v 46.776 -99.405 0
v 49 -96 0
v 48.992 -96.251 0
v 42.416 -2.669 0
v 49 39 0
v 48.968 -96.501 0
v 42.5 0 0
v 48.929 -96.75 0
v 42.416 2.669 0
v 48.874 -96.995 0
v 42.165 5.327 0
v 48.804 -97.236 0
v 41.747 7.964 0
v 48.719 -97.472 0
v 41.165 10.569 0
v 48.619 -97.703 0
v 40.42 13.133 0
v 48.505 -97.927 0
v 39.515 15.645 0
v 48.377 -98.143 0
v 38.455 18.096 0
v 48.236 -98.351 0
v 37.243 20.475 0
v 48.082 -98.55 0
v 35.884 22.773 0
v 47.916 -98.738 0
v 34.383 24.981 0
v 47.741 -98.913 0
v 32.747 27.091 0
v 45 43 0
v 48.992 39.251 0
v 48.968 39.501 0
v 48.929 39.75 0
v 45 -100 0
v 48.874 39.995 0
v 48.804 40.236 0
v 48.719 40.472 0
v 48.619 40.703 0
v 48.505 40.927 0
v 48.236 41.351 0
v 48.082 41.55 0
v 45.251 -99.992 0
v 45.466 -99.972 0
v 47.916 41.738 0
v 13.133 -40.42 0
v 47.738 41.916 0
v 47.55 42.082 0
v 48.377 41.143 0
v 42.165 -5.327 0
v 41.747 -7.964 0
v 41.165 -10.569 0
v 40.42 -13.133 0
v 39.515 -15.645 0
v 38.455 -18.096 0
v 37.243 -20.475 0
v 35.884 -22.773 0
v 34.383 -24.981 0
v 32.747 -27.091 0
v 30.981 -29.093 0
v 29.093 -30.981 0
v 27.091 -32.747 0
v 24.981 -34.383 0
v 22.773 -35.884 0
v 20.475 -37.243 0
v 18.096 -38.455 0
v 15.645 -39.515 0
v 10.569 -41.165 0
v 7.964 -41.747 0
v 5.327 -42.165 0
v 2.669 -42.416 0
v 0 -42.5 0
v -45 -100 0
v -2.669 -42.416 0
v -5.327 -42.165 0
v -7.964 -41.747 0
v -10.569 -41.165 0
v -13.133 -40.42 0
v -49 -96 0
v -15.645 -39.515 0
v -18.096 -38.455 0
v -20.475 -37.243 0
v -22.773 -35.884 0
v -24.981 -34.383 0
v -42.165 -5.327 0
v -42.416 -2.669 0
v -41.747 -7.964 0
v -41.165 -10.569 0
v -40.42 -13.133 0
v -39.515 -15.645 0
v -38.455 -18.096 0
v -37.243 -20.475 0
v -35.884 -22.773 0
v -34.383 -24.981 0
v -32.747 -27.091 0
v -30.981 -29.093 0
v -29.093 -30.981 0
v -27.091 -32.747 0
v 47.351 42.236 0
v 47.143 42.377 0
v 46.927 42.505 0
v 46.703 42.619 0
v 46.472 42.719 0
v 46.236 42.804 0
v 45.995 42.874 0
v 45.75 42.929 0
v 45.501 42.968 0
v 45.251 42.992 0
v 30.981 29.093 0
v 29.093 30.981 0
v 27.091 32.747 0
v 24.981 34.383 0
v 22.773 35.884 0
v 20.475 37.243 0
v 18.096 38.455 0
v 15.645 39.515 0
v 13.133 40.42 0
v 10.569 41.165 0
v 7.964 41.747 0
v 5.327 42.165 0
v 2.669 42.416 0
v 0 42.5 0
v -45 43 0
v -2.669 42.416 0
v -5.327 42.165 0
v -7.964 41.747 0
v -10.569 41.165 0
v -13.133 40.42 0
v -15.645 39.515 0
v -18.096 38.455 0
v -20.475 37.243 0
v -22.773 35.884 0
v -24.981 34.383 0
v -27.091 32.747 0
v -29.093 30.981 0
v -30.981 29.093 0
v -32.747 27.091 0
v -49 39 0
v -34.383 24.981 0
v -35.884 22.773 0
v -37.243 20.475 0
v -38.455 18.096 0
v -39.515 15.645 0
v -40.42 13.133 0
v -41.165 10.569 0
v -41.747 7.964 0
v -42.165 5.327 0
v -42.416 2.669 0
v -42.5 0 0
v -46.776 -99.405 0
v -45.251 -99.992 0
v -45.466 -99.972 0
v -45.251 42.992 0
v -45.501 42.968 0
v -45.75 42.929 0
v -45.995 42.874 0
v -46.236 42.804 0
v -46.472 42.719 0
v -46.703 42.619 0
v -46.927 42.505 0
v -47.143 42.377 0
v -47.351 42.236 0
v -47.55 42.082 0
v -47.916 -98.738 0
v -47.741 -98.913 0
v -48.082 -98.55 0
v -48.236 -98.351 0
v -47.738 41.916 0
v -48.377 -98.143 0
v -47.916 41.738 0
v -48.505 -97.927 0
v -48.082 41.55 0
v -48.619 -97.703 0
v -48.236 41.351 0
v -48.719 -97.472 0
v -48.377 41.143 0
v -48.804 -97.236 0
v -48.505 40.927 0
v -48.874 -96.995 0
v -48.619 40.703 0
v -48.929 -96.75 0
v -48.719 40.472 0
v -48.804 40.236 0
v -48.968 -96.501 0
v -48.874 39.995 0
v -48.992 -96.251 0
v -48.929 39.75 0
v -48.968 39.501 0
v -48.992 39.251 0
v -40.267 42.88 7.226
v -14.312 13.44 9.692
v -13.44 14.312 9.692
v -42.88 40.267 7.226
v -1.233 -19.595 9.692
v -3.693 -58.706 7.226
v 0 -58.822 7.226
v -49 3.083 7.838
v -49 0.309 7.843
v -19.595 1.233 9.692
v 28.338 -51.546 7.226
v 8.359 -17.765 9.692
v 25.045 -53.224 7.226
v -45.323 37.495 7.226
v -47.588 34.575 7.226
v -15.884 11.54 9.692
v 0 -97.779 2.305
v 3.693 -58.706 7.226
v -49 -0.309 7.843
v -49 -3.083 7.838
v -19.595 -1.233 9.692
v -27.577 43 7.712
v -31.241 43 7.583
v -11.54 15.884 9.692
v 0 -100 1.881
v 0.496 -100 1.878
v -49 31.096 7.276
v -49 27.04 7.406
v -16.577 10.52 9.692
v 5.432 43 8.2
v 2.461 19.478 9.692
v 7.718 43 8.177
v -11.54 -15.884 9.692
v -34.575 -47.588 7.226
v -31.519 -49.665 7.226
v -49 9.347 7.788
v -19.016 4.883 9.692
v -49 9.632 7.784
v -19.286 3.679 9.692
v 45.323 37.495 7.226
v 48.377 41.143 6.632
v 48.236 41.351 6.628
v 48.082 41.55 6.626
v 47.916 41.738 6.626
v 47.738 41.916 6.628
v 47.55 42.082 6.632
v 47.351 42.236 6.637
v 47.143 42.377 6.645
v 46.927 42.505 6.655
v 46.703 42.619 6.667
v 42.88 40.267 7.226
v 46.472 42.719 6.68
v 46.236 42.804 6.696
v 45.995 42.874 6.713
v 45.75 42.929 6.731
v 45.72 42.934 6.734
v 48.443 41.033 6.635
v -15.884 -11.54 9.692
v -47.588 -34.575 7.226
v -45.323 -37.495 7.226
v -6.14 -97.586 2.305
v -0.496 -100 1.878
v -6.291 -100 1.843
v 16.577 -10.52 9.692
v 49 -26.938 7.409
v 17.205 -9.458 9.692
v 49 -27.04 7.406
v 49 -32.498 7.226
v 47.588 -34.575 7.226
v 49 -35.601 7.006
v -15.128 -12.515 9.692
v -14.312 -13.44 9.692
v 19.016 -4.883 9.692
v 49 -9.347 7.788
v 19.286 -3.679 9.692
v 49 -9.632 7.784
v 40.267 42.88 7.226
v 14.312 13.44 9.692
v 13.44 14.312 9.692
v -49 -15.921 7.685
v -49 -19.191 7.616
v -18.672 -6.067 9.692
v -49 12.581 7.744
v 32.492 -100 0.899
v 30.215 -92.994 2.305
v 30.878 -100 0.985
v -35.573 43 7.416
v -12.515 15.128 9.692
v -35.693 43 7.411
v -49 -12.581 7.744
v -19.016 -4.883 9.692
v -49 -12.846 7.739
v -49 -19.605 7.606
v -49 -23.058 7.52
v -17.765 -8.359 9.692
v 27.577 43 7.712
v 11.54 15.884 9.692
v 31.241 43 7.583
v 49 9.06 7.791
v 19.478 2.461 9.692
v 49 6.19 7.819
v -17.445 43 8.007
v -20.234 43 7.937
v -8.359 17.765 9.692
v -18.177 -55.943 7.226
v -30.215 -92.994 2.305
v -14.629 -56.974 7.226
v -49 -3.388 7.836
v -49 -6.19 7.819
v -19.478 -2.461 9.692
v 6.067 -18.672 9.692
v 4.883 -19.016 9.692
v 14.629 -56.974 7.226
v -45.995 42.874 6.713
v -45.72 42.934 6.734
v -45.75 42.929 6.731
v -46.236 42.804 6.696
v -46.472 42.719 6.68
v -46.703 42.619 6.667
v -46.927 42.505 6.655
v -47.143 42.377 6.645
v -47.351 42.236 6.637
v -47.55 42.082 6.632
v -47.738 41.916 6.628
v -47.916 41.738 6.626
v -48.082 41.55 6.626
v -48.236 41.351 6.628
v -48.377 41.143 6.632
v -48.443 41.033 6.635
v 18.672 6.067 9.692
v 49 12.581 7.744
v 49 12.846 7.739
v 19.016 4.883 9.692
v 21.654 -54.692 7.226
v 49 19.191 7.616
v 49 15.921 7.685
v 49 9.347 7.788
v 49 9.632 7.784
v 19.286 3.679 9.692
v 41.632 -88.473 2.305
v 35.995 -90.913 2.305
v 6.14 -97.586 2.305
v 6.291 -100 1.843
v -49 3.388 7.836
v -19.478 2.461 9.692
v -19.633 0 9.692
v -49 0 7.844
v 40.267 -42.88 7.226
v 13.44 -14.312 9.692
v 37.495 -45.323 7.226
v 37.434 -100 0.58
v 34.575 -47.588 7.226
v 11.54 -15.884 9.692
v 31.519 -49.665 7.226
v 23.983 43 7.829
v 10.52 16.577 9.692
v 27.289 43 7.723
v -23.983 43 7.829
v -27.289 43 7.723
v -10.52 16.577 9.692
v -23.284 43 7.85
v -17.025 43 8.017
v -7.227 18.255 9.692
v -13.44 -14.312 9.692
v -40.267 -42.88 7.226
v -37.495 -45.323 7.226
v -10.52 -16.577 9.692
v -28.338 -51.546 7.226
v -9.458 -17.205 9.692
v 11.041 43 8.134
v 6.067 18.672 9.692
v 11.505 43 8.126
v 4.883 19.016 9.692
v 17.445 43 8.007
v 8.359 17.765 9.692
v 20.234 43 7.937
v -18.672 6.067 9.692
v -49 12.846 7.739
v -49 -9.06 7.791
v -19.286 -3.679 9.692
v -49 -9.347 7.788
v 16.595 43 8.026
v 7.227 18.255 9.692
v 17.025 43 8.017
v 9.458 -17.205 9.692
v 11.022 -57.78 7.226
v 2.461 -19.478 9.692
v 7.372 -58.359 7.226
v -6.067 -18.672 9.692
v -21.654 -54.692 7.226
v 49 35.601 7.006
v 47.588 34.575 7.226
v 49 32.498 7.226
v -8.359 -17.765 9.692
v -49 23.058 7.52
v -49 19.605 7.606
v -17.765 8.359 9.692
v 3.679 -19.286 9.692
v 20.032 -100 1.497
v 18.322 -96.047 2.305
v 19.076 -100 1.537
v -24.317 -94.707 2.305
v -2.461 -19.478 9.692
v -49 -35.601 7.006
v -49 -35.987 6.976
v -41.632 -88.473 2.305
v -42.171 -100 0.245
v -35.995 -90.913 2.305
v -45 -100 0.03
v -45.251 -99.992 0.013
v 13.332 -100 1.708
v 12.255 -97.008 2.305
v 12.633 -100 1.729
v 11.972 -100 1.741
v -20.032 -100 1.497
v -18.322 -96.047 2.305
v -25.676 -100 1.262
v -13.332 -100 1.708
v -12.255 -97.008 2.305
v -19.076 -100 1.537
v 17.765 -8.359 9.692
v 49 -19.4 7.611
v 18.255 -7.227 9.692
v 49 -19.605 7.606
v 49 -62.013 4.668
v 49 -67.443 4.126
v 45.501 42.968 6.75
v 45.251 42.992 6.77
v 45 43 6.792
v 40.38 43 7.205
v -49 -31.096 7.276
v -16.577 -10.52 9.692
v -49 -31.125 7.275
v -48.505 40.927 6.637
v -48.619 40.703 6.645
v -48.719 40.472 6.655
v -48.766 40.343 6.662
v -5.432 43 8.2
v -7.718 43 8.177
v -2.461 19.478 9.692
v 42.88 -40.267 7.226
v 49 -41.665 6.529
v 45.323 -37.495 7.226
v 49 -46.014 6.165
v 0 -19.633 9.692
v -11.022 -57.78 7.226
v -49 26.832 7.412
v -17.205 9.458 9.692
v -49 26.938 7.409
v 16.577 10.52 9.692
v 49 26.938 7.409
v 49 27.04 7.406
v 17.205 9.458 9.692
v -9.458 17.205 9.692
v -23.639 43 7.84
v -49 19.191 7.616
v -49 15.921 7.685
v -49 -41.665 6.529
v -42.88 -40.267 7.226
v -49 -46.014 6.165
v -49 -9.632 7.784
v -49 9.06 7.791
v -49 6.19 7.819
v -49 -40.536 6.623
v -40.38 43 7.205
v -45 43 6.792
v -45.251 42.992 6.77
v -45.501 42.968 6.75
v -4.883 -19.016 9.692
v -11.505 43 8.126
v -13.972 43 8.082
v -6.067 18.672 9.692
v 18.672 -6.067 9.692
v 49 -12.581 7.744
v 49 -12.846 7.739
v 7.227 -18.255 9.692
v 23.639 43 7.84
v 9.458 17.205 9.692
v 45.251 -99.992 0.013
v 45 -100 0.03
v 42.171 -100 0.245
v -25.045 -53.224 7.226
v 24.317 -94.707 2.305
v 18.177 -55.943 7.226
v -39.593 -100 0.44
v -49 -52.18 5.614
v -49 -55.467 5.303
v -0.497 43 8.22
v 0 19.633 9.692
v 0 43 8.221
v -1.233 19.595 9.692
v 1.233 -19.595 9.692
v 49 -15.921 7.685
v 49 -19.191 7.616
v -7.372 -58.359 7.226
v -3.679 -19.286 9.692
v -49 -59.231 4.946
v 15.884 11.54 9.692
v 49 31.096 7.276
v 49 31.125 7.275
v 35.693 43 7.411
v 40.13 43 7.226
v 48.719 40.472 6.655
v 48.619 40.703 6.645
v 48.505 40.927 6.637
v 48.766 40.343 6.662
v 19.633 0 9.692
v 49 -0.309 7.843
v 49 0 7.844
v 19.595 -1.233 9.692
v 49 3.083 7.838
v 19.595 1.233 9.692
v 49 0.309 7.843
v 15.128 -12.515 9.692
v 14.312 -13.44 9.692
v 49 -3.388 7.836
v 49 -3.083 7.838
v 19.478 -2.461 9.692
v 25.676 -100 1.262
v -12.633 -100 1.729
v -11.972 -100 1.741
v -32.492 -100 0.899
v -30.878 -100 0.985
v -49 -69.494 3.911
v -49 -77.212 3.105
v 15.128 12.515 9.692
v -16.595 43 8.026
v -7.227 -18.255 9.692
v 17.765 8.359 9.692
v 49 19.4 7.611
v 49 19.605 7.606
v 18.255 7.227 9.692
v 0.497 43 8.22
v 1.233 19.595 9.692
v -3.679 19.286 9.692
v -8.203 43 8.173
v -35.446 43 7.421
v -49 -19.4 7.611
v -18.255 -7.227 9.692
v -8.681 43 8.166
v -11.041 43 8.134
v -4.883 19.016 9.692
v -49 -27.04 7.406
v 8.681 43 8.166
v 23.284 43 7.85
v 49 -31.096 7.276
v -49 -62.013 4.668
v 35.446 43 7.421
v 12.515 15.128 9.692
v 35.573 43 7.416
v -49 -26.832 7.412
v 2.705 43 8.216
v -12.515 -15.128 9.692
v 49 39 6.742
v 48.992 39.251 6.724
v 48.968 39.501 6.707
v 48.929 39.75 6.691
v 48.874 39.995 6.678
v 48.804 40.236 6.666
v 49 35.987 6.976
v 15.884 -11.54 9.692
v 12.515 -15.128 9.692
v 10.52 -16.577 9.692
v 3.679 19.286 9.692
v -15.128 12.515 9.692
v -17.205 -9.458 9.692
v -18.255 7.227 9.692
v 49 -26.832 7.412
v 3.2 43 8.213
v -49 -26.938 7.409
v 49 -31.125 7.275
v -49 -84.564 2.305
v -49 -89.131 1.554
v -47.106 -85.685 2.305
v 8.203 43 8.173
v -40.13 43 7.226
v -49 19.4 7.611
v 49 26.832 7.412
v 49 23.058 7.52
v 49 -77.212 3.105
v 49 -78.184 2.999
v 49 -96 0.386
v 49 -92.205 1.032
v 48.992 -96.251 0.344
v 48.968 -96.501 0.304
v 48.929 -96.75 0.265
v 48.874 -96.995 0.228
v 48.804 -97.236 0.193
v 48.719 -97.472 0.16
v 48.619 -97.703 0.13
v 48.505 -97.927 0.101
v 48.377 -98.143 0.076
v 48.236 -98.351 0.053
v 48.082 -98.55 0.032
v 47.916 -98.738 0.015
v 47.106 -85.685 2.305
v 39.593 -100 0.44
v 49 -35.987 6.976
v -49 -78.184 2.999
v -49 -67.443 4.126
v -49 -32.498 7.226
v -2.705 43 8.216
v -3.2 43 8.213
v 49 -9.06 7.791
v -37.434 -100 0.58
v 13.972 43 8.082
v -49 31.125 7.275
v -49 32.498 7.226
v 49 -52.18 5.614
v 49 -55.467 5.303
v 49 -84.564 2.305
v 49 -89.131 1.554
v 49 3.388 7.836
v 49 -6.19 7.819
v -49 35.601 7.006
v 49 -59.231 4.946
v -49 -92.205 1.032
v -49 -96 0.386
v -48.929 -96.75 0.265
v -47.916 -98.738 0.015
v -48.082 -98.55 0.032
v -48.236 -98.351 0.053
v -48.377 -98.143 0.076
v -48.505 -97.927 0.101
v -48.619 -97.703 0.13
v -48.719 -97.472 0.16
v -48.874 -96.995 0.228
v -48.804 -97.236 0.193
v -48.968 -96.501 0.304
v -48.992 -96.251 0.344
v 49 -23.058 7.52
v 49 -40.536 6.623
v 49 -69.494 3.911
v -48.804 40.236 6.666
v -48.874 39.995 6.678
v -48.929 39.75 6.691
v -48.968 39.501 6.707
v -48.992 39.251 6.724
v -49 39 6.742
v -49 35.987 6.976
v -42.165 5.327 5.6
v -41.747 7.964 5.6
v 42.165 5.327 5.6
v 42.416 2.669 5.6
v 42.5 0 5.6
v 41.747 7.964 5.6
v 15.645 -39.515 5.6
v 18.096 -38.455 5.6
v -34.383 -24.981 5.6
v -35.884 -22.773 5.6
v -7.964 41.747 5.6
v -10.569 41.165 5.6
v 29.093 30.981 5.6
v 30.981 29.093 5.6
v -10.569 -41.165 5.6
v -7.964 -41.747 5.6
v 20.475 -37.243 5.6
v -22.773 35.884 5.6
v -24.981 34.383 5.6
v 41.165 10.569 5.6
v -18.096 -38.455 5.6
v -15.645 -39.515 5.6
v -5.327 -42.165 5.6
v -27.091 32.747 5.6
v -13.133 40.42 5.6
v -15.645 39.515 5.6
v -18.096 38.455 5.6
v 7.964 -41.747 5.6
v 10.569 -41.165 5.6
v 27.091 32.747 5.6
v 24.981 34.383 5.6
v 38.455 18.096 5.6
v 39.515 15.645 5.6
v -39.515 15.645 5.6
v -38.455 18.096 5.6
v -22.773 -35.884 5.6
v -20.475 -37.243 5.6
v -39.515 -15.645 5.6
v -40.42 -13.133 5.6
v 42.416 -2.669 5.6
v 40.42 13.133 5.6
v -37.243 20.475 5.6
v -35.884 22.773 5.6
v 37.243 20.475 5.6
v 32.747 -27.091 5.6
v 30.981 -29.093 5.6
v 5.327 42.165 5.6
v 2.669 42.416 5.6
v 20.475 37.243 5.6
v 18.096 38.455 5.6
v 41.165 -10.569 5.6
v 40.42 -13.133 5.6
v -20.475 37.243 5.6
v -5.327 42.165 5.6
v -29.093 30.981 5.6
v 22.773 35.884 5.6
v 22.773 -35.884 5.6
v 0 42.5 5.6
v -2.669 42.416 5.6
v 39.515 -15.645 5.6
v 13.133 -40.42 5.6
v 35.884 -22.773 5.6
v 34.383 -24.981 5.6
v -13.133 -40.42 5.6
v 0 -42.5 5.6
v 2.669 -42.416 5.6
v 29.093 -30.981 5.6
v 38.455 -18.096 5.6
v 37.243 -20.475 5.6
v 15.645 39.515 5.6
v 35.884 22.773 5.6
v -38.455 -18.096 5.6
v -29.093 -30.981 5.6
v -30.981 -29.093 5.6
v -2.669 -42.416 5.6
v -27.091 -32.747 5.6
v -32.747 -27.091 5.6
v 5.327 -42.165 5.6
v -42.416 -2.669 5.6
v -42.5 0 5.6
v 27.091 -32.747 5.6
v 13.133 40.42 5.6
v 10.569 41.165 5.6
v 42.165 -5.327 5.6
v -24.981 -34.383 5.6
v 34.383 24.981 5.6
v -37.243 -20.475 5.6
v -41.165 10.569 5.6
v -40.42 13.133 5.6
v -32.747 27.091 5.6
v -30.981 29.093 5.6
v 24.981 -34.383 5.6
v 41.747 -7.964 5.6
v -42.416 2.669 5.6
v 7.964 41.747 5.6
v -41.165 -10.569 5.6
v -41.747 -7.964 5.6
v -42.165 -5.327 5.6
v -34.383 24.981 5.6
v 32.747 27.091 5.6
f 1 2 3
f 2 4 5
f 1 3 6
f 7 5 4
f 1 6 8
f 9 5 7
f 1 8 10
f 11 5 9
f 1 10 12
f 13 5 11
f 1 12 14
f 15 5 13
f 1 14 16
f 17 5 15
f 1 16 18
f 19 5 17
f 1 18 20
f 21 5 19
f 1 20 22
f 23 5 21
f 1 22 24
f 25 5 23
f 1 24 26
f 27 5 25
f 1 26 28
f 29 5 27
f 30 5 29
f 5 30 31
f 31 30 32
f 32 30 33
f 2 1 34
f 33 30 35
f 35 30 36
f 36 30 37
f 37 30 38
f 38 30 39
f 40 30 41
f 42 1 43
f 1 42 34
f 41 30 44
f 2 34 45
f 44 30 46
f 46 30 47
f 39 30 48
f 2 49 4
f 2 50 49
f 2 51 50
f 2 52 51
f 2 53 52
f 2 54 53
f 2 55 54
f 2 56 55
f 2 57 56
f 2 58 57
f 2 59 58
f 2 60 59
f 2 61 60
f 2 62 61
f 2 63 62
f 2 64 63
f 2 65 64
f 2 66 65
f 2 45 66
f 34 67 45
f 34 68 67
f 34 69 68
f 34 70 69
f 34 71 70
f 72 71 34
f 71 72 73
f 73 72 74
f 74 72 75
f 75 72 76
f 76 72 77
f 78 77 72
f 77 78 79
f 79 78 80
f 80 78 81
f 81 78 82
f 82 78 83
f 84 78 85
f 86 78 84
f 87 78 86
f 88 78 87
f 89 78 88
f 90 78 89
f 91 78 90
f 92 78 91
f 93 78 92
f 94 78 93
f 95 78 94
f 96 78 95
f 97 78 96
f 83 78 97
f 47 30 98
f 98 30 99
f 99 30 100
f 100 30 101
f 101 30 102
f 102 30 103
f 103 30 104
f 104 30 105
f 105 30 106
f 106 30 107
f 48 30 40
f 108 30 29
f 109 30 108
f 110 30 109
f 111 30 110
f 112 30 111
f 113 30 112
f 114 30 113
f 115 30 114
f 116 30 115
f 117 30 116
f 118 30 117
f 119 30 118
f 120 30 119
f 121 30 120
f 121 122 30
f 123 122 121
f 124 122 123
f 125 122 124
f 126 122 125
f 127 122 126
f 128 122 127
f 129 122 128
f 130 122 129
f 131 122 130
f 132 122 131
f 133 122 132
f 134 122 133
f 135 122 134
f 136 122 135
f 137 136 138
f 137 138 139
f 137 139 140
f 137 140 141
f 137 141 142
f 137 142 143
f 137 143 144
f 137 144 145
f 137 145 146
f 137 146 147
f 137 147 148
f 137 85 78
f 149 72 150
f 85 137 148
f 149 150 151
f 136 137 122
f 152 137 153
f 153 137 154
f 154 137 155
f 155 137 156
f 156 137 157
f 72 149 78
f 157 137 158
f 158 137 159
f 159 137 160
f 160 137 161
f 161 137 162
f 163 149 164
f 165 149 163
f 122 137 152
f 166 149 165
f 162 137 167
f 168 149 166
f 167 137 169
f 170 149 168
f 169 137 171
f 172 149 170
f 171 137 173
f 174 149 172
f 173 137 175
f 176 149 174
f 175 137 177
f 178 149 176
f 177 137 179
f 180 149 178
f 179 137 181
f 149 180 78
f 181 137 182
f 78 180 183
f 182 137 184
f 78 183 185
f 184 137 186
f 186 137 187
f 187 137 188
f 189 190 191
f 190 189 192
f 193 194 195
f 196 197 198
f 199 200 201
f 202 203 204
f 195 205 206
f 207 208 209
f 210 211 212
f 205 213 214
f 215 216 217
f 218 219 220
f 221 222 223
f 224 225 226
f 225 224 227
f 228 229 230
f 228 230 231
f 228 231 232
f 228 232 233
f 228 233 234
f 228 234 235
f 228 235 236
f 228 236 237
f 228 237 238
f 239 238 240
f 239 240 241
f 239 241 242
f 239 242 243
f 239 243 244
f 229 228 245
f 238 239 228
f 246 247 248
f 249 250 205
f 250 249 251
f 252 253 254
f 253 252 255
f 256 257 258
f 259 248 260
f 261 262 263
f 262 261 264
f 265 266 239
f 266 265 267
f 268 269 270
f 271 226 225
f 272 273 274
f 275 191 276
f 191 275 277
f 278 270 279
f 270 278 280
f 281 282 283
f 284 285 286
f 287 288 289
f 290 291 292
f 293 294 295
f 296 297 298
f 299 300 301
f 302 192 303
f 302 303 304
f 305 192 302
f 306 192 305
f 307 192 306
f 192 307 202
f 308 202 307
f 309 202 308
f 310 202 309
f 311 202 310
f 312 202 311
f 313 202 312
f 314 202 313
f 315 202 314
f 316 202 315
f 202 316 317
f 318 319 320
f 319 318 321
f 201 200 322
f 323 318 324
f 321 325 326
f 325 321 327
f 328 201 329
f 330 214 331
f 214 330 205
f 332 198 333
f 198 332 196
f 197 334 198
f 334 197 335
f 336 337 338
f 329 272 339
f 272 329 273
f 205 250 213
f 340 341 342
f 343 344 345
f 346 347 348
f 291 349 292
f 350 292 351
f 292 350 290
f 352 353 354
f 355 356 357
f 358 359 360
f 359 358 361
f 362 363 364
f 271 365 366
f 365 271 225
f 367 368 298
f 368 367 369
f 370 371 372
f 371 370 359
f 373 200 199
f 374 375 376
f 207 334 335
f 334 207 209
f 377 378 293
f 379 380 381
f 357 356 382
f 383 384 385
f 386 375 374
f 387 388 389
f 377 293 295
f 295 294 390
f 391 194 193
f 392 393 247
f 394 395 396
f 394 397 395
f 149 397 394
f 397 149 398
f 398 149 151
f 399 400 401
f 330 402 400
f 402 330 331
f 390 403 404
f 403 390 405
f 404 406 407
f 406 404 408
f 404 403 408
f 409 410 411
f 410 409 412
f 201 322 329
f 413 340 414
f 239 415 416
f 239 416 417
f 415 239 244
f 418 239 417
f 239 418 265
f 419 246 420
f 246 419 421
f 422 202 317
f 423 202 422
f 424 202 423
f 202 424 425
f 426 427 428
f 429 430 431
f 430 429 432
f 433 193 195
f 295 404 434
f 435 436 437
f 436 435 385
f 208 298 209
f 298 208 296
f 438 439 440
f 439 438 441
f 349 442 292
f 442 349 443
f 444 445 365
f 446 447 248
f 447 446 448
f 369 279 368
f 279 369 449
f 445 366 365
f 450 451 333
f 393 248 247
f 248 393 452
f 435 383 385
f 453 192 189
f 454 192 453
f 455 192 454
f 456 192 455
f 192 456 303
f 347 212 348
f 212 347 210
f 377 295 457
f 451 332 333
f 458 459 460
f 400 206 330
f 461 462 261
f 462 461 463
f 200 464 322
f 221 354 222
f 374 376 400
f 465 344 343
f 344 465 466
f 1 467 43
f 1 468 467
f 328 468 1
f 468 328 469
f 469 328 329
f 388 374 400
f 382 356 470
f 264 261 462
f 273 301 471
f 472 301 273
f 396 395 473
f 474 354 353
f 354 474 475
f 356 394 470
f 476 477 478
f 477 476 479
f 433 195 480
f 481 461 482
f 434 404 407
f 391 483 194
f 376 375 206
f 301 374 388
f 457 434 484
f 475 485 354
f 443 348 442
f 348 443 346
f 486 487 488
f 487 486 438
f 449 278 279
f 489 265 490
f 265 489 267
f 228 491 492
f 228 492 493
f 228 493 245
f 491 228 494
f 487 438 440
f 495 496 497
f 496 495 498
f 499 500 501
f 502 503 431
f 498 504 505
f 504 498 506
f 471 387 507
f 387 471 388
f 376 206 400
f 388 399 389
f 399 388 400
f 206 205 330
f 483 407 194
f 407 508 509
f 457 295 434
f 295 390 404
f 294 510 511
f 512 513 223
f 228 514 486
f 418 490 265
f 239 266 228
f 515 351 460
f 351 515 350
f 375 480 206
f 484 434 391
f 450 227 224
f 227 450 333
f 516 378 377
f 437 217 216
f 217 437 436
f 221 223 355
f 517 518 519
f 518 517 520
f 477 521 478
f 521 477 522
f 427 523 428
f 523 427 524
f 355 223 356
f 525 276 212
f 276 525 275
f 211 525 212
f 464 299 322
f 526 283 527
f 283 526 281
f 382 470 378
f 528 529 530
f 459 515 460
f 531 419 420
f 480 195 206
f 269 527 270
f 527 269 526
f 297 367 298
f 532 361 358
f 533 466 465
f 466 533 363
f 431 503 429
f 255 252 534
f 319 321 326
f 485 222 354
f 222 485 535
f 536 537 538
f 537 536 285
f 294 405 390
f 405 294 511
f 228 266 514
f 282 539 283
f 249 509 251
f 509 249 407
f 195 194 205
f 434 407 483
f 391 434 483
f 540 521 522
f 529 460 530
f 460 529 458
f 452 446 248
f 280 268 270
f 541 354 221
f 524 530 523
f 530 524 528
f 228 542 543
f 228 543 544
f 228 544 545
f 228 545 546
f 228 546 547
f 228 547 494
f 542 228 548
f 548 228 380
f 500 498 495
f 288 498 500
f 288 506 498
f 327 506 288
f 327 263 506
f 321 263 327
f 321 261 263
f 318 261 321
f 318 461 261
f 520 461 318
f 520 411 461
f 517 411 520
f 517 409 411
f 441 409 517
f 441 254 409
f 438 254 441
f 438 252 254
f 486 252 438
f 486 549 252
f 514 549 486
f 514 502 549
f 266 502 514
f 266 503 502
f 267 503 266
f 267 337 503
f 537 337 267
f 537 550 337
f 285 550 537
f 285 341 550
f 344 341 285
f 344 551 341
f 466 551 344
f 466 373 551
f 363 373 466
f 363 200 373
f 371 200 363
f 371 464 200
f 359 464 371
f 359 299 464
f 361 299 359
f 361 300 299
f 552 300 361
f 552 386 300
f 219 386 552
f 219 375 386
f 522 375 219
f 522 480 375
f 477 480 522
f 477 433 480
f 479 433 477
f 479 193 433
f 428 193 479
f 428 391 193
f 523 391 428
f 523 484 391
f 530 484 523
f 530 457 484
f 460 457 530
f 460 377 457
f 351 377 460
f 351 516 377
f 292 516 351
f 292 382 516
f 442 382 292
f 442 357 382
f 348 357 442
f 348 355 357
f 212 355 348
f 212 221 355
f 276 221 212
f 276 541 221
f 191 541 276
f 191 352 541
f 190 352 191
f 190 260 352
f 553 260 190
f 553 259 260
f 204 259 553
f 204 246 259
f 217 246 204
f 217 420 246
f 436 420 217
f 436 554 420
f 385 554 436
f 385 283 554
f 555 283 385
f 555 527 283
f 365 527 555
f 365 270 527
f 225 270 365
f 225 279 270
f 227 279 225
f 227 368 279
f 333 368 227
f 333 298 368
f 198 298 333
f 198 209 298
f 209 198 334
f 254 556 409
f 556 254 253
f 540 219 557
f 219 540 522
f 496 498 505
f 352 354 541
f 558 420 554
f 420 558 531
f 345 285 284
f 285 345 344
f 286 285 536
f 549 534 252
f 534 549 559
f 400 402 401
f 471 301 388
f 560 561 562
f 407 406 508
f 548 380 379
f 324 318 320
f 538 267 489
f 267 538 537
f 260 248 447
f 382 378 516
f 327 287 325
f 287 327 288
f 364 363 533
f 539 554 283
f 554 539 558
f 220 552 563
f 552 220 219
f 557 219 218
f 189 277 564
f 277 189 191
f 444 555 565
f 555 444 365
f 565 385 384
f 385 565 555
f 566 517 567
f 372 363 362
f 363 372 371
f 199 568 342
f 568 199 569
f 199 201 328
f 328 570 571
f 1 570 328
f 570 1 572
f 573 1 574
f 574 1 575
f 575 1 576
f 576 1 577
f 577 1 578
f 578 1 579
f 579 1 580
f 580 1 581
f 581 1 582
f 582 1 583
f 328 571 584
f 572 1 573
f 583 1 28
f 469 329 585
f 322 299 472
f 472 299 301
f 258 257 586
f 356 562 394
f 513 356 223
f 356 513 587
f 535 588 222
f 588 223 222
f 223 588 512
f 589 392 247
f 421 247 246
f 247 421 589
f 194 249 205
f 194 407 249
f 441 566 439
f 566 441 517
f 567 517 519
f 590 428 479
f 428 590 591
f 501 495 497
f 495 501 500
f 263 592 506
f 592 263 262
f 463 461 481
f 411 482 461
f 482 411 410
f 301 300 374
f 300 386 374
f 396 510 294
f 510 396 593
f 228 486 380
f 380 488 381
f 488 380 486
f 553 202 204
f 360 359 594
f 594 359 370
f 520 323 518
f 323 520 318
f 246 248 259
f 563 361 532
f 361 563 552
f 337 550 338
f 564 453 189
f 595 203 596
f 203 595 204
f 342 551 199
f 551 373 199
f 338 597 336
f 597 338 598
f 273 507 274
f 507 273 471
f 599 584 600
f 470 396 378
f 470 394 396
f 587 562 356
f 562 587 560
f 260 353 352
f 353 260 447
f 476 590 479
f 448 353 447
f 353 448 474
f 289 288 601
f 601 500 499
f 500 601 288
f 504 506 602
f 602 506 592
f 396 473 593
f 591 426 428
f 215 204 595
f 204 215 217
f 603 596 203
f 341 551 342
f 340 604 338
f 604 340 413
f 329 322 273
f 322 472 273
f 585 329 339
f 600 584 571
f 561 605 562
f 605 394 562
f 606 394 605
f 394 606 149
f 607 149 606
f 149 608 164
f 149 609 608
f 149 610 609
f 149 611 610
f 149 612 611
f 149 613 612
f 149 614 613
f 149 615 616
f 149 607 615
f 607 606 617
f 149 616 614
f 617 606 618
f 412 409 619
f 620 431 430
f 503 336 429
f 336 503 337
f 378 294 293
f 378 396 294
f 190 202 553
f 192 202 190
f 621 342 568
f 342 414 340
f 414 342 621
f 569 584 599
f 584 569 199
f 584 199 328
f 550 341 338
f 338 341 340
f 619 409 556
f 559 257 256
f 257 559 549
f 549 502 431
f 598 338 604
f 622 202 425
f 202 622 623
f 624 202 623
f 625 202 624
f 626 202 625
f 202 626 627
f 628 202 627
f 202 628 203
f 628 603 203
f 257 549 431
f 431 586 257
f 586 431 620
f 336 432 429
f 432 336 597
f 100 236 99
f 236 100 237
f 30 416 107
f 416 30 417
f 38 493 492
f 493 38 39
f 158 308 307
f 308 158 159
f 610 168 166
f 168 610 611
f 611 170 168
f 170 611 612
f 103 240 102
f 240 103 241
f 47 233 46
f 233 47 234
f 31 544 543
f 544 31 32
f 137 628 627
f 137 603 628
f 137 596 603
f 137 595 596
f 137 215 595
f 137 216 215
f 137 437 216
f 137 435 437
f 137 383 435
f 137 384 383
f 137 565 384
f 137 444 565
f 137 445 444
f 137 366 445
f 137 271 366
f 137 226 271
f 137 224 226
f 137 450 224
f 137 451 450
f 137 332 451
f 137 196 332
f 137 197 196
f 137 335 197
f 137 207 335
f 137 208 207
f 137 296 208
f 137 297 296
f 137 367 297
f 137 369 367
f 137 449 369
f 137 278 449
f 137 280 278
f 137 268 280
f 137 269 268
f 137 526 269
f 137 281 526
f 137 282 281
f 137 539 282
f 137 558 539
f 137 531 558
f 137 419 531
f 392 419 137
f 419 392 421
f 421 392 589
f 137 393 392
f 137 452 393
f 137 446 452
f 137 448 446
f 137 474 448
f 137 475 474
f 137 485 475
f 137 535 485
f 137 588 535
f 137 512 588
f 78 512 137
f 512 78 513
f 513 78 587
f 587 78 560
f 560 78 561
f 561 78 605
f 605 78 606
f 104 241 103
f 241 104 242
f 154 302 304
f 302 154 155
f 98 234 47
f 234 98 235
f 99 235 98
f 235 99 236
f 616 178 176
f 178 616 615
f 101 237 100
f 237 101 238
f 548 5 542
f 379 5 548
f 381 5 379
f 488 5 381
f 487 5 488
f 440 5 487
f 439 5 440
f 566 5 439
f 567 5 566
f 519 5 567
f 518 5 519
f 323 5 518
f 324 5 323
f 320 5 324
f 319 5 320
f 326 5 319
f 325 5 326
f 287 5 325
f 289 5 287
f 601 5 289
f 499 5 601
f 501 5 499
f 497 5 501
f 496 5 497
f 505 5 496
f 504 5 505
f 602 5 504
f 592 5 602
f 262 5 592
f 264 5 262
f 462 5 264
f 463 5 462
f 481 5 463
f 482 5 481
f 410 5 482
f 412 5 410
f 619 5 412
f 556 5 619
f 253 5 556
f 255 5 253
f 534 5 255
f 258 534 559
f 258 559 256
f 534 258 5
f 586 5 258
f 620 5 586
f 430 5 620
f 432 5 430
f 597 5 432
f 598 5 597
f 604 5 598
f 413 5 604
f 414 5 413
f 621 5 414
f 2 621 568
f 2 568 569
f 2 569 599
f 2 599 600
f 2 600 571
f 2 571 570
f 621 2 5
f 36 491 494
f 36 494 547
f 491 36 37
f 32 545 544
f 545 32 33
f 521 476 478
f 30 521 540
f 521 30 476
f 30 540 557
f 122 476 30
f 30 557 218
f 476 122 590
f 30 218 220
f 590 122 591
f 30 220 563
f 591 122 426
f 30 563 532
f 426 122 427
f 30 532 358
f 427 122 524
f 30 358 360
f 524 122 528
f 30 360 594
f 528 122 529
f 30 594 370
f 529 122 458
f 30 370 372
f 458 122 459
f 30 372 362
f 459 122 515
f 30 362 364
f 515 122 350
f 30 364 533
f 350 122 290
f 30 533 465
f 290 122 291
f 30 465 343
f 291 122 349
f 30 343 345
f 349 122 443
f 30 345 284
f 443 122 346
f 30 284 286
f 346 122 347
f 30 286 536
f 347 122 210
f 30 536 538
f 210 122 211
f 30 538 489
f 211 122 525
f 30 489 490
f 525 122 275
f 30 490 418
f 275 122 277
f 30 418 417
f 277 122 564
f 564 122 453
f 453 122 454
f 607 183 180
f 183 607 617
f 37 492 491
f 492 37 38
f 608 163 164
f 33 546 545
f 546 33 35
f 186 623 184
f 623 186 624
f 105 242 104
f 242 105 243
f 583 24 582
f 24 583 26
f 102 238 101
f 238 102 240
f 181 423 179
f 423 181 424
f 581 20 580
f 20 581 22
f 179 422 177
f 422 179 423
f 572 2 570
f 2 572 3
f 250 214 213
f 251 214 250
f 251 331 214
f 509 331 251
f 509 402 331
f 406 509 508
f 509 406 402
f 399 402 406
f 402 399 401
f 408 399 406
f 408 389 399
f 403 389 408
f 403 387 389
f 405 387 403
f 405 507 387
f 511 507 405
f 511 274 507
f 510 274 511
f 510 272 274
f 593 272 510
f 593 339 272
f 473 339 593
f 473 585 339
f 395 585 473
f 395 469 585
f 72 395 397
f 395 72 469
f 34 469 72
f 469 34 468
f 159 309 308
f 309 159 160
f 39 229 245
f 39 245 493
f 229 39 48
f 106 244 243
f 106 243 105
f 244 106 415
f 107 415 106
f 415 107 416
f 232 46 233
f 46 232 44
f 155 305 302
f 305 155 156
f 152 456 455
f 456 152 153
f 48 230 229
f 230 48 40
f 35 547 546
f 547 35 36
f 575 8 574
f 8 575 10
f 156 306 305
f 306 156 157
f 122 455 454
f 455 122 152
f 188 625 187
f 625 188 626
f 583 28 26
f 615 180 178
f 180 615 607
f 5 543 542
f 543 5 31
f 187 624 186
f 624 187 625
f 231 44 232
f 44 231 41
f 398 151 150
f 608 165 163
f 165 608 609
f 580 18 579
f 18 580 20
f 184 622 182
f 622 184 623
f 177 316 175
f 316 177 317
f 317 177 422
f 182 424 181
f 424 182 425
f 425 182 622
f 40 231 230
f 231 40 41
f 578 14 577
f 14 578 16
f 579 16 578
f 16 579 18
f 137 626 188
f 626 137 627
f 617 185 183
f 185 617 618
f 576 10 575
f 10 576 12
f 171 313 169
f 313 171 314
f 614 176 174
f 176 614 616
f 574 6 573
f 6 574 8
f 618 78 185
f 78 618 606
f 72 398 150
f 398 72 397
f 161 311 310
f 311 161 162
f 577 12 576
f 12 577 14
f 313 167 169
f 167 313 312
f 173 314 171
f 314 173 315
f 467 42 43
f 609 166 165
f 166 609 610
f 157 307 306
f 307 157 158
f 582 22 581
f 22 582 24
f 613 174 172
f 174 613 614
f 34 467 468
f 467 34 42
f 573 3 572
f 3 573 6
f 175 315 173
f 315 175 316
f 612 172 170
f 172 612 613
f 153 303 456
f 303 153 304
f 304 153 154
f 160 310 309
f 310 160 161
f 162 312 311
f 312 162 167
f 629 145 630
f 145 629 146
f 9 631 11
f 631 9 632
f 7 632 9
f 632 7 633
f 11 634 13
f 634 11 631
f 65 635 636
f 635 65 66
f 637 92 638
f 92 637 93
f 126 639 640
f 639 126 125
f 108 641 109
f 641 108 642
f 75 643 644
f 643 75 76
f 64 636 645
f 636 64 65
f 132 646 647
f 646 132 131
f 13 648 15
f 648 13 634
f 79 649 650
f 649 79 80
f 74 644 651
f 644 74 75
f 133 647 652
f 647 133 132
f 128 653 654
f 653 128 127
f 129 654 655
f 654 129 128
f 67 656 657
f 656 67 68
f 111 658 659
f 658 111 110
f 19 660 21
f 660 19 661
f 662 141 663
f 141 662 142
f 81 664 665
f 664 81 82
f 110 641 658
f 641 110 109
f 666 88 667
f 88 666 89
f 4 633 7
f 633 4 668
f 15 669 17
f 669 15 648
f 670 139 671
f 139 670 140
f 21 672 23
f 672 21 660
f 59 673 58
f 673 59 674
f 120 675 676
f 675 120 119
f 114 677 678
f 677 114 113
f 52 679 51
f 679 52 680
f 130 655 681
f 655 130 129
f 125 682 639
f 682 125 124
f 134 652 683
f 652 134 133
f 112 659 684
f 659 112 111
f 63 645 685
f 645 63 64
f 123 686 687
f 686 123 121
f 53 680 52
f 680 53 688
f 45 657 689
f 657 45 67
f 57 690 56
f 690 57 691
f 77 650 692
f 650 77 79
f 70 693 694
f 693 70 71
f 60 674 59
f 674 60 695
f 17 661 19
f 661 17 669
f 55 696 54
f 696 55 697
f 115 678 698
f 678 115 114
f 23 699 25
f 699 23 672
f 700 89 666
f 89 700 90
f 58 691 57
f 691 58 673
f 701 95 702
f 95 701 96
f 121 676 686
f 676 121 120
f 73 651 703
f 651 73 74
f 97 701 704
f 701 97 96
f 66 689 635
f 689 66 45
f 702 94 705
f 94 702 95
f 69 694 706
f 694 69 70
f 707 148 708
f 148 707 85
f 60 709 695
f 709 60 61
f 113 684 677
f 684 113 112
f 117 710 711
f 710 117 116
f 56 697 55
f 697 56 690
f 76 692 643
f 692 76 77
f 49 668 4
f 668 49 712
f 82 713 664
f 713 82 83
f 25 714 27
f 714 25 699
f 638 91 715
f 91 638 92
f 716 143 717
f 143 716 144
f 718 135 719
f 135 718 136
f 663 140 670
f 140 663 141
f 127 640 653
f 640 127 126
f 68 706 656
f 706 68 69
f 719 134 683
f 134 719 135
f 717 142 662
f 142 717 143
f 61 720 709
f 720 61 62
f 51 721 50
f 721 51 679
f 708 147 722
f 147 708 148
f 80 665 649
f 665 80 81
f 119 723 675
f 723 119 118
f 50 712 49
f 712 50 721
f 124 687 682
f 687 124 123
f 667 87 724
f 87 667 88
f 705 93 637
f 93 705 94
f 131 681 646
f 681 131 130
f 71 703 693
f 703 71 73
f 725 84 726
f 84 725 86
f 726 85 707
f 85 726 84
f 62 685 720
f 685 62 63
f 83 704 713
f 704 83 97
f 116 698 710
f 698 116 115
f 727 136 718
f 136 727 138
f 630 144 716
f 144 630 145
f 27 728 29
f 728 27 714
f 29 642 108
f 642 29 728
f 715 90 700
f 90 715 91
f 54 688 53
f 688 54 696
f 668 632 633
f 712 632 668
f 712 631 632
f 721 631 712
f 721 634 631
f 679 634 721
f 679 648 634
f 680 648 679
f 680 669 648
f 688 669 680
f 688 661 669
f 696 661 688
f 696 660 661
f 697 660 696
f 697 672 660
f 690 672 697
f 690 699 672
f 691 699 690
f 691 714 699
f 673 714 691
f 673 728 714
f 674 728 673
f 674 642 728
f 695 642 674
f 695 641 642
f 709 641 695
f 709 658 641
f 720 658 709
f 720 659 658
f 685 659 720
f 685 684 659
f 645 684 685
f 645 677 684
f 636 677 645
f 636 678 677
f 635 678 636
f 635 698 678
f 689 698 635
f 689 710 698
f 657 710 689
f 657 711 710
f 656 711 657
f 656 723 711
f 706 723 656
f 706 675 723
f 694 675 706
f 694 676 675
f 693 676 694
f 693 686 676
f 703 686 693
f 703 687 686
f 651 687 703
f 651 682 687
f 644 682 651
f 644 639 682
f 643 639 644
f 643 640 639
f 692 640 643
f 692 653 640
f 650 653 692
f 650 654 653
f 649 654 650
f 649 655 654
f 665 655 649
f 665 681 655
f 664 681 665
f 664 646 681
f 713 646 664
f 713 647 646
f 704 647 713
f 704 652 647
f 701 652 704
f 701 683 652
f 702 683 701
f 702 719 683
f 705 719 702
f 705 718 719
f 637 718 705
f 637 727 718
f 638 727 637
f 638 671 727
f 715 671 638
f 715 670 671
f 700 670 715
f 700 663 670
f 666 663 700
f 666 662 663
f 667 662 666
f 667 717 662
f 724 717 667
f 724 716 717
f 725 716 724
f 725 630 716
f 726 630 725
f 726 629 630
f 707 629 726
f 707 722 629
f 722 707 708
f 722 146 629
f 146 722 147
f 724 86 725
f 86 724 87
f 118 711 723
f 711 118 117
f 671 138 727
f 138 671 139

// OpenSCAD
height=143;
width=98;
depth=10;
widthOffset=width/2;
heightOffset=43;
index=width/10;

radius=sqrt(pow(widthOffset,2)+pow(height-heightOffset,2));
offSet=(pow(radius,2)-pow(depth,2))/(2*depth);
bigRadius=offSet+depth;
$fn=100;

echo(offSet,bigRadius);

difference()
{
    intersection()
    {
        //rounded shape
        translate([0,0,-offSet])
            sphere(bigRadius);
        //remove excess material
        translate([-width+widthOffset+4,-height+heightOffset+4,0])
            minkowski()
                {
                    cube([width-8,height-8,depth]);
                    cylinder(depth,4,4);
                }
        union()
        {
            //grid
            linear_extrude(depth)
                difference()
                {
                    circle(radius);
                    for(a = [-4:4])
                        for(b = [-20:20])
                            translate([a*index,b*index*0.575,0])
                                if(!(a+b)%2)
                                    circle(index*0.57, $fn=6);
                }
                //rounded borders
                translate([-widthOffset+4,-height+heightOffset+4,0])
                difference()
                {
                    minkowski()
                    {
                        cube([width-8,height-8,depth]);
                        cylinder(depth,4,4);
                    }
                    translate([4,4,0])
                    minkowski()
                    {
                        cube([width-16,height-16,depth]);
                        cylinder(depth,4,4);
                    }
                }
        }        
    }
    //space for speaker element
    cylinder(5.6,85/2,85/2);
}
